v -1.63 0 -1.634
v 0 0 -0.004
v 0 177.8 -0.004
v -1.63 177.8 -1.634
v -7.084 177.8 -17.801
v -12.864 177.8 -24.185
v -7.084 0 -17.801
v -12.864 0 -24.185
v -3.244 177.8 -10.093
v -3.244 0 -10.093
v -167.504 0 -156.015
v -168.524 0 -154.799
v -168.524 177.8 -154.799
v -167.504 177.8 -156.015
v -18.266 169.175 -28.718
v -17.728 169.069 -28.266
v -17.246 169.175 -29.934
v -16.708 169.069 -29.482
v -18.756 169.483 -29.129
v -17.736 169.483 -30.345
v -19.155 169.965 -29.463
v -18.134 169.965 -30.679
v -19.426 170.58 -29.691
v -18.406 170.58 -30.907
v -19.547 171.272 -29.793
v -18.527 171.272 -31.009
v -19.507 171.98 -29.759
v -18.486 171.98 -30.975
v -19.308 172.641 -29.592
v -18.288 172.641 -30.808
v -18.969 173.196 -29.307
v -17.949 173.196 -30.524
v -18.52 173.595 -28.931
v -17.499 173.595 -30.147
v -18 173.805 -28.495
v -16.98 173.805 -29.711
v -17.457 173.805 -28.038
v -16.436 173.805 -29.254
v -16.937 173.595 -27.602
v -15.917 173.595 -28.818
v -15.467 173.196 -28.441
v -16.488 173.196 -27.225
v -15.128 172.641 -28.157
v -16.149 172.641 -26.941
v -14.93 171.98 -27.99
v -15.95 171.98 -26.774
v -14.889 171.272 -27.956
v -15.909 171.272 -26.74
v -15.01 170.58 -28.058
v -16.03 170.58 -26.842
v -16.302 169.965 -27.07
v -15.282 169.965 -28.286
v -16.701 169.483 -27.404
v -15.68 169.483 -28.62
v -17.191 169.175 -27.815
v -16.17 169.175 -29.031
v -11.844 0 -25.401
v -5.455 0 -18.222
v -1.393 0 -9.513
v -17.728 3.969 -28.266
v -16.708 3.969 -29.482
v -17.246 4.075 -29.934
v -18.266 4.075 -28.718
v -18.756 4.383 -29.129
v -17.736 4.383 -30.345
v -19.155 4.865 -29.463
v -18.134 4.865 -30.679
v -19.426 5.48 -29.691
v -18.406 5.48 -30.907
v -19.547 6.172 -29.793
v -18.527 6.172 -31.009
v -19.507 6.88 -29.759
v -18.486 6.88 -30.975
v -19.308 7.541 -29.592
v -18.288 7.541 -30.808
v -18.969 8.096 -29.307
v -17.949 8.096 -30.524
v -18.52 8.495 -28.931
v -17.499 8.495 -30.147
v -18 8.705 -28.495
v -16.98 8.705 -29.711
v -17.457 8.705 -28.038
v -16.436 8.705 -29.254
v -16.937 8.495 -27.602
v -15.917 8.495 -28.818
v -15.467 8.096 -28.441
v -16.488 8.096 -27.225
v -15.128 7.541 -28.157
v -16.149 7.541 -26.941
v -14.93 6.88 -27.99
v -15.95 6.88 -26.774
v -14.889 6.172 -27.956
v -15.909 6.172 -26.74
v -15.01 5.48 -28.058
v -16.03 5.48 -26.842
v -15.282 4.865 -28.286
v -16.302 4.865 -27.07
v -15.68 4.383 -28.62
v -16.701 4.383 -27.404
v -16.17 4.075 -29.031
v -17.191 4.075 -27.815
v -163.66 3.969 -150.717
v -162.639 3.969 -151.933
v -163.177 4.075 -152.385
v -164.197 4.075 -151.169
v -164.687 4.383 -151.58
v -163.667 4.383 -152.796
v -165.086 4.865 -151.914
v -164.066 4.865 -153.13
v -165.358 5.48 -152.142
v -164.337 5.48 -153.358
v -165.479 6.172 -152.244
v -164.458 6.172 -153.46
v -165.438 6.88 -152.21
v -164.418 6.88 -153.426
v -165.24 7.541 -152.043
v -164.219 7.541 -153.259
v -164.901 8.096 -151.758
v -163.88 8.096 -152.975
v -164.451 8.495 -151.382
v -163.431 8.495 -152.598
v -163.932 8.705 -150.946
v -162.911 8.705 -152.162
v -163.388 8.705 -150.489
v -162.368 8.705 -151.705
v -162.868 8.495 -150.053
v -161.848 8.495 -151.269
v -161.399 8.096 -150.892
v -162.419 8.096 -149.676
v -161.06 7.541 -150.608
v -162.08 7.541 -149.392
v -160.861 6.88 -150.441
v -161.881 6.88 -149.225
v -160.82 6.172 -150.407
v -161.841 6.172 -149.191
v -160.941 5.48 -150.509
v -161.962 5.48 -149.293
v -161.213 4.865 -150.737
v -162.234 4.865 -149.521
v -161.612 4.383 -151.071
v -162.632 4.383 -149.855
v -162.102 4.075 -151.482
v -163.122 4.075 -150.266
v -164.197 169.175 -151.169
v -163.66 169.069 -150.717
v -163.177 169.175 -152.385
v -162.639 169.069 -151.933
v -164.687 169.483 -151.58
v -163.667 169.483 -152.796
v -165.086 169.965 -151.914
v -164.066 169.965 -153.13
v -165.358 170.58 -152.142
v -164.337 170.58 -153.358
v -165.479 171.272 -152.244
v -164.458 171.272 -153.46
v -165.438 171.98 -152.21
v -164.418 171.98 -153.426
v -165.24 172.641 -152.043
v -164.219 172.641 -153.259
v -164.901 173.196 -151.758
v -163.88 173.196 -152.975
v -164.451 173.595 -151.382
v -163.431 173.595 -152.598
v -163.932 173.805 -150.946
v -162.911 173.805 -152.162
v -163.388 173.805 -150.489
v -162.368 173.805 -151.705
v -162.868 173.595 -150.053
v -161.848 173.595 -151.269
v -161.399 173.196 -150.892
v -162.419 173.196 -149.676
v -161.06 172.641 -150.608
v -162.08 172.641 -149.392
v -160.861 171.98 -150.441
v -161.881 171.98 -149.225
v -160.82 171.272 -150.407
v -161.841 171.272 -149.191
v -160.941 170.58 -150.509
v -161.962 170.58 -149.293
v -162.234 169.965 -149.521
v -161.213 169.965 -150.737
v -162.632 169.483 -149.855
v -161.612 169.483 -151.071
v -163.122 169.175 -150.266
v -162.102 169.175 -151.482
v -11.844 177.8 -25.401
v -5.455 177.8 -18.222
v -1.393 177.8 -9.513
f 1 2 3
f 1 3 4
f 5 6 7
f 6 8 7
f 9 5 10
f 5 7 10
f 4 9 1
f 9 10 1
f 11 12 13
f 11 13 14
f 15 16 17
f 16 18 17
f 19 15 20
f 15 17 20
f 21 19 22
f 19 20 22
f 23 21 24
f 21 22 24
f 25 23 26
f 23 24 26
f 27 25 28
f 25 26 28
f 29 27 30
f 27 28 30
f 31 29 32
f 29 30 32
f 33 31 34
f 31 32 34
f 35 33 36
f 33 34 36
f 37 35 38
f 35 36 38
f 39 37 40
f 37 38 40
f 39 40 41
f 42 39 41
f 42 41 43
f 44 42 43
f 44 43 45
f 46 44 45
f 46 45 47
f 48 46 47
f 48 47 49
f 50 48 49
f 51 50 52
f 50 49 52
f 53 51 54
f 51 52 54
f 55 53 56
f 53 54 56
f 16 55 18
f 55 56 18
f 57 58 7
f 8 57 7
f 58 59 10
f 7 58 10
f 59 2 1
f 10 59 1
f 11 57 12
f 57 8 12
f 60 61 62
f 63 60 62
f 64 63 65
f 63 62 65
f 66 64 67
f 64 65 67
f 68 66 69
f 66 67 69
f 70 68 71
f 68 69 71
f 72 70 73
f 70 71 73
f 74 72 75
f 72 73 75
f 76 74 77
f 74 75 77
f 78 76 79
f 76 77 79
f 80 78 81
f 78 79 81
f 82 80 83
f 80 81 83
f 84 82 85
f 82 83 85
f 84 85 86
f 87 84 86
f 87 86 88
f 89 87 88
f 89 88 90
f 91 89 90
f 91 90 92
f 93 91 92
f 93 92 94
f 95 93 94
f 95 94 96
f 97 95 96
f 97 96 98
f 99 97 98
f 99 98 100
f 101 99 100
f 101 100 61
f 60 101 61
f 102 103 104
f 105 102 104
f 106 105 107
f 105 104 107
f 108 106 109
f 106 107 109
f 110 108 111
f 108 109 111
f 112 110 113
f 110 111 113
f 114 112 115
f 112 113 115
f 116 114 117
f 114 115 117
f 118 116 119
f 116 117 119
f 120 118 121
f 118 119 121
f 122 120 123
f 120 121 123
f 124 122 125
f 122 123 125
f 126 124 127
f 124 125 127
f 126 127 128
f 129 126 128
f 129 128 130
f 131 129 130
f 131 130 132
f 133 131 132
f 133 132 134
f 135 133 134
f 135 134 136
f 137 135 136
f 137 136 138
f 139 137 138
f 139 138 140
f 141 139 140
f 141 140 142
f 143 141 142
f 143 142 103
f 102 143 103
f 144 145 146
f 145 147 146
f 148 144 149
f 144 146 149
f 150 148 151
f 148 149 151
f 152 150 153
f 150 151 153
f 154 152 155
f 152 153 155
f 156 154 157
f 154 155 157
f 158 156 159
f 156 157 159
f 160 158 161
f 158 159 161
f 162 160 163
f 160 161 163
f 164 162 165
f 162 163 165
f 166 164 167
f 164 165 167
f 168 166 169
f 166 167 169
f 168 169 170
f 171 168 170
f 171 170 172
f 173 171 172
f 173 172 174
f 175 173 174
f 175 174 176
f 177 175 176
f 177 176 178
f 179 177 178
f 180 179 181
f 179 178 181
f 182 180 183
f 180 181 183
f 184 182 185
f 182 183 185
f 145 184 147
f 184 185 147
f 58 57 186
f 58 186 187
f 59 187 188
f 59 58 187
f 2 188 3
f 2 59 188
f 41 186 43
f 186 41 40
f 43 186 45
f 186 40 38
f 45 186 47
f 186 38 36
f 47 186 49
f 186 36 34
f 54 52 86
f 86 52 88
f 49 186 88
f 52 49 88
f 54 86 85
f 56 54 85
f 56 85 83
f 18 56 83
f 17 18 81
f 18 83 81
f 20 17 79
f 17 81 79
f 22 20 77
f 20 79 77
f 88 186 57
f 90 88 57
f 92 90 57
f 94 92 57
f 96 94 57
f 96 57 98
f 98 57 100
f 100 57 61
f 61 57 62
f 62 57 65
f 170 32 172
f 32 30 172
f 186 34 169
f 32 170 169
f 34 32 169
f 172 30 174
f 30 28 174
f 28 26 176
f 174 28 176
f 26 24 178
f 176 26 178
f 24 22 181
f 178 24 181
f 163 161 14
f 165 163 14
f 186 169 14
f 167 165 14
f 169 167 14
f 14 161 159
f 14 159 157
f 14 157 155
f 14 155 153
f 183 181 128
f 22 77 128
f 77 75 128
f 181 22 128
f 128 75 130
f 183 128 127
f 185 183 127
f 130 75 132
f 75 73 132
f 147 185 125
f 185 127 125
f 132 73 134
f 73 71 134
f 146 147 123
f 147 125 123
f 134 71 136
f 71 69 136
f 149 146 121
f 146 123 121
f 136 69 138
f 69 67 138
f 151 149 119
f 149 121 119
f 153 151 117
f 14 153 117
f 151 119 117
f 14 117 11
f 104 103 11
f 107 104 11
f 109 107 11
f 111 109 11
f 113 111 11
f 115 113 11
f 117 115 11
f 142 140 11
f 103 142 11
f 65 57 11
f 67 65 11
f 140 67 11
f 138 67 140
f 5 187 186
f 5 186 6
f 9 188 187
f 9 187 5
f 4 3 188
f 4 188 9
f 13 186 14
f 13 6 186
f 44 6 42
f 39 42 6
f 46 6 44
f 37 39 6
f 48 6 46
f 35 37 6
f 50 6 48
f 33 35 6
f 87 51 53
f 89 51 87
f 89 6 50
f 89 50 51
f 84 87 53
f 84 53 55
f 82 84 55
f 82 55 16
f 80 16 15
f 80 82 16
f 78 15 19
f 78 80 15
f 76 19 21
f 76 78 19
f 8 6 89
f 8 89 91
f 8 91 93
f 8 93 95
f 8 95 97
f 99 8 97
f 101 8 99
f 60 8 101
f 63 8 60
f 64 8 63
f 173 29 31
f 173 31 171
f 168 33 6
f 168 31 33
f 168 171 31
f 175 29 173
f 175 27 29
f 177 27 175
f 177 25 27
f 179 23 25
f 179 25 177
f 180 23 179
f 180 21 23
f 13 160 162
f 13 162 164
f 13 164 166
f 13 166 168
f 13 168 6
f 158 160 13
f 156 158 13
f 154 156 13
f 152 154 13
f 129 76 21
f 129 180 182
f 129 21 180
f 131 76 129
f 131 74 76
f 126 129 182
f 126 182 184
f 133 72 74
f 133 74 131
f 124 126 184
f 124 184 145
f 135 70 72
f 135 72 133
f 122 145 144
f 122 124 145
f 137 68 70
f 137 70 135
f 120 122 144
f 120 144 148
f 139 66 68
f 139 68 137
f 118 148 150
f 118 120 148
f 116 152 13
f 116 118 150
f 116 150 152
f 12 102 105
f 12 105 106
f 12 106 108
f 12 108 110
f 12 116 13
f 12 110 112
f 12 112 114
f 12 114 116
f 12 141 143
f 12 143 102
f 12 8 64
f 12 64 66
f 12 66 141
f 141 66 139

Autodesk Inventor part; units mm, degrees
ref_plane "YZ Plane" through (0, 0, 0) normal (1, 0, 0) x (0, 1, 0)
ref_plane "XZ Plane" through (0, 0, 0) normal (0, 1, 0) x (-1, 0, 0)
ref_plane "XY Plane" through (0, 0, 0) normal (0, 0, 1) x (1, 0, 0)
sketch "Sketch1" plane through (0, 0, 0) normal (0, 1, 0) x (-1, 0, 0)
  line L0 (131.6241, -133.8819) -> (133.2116, -133.8819)
  arc A0 (0, 0) -> (11.8436, -25.4008) centre (33.1555, -0.0022) ccw
  line L1 (11.8436, -25.4008) -> (167.5038, -156.0152)
  arc A1 (1.5875, 0) -> (1.5875, -0.0044) centre (33.1555, -0.0022) ccw
  line L2 (12.864, -24.1847) -> (168.5242, -154.7991)
  line L3 (168.5242, -154.7991) -> (167.5038, -156.0152)
  line L4 (0, -0.0044) -> (1.6297, -1.6341)
  arc A2 (1.6297, -1.6341) -> (12.864, -24.1847) centre (33.1555, -0.0022) ccw
  dimension "d15" = 1.5875
extrude "Extrusion1" add sketch "Sketch1" along normal blind 177.8
sketch "Sketch2" plane through (-12.864, 0, -24.1847) normal (-0.6427876, 0, 0.7660444) x (0.7660444, 0, 0.6427876)
  line L0 (0, 0) -> (0, 177.8) projected
  line L1 (-203.2, 0) -> (-185.2395, 0) construction
  line L2 (0, 165.1) -> (17.9605, 165.1) construction
  line L3 (-203.2, 165.1) -> (-185.2395, 165.1) construction
  point P0 (25.4, 0)
  point P1 (-6.35, 6.35)
  point P2 (-196.85, 6.35)
  point P3 (-203.2, 177.8)
  point P4 (-6.35, 171.45)
  point P5 (-196.85, 171.45)
hole "Hole1" at (-163.6598, 6.35, -150.7174) at (-163.6598, 171.45, -150.7174) at (-17.7284, 171.45, -28.2664) at (-17.7284, 6.35, -28.2664) direction (0.6427876, 0, -0.7660444) diameter 4.7625 end through all
properties part number "intakeabs" material "Polyethylene, High Density"
